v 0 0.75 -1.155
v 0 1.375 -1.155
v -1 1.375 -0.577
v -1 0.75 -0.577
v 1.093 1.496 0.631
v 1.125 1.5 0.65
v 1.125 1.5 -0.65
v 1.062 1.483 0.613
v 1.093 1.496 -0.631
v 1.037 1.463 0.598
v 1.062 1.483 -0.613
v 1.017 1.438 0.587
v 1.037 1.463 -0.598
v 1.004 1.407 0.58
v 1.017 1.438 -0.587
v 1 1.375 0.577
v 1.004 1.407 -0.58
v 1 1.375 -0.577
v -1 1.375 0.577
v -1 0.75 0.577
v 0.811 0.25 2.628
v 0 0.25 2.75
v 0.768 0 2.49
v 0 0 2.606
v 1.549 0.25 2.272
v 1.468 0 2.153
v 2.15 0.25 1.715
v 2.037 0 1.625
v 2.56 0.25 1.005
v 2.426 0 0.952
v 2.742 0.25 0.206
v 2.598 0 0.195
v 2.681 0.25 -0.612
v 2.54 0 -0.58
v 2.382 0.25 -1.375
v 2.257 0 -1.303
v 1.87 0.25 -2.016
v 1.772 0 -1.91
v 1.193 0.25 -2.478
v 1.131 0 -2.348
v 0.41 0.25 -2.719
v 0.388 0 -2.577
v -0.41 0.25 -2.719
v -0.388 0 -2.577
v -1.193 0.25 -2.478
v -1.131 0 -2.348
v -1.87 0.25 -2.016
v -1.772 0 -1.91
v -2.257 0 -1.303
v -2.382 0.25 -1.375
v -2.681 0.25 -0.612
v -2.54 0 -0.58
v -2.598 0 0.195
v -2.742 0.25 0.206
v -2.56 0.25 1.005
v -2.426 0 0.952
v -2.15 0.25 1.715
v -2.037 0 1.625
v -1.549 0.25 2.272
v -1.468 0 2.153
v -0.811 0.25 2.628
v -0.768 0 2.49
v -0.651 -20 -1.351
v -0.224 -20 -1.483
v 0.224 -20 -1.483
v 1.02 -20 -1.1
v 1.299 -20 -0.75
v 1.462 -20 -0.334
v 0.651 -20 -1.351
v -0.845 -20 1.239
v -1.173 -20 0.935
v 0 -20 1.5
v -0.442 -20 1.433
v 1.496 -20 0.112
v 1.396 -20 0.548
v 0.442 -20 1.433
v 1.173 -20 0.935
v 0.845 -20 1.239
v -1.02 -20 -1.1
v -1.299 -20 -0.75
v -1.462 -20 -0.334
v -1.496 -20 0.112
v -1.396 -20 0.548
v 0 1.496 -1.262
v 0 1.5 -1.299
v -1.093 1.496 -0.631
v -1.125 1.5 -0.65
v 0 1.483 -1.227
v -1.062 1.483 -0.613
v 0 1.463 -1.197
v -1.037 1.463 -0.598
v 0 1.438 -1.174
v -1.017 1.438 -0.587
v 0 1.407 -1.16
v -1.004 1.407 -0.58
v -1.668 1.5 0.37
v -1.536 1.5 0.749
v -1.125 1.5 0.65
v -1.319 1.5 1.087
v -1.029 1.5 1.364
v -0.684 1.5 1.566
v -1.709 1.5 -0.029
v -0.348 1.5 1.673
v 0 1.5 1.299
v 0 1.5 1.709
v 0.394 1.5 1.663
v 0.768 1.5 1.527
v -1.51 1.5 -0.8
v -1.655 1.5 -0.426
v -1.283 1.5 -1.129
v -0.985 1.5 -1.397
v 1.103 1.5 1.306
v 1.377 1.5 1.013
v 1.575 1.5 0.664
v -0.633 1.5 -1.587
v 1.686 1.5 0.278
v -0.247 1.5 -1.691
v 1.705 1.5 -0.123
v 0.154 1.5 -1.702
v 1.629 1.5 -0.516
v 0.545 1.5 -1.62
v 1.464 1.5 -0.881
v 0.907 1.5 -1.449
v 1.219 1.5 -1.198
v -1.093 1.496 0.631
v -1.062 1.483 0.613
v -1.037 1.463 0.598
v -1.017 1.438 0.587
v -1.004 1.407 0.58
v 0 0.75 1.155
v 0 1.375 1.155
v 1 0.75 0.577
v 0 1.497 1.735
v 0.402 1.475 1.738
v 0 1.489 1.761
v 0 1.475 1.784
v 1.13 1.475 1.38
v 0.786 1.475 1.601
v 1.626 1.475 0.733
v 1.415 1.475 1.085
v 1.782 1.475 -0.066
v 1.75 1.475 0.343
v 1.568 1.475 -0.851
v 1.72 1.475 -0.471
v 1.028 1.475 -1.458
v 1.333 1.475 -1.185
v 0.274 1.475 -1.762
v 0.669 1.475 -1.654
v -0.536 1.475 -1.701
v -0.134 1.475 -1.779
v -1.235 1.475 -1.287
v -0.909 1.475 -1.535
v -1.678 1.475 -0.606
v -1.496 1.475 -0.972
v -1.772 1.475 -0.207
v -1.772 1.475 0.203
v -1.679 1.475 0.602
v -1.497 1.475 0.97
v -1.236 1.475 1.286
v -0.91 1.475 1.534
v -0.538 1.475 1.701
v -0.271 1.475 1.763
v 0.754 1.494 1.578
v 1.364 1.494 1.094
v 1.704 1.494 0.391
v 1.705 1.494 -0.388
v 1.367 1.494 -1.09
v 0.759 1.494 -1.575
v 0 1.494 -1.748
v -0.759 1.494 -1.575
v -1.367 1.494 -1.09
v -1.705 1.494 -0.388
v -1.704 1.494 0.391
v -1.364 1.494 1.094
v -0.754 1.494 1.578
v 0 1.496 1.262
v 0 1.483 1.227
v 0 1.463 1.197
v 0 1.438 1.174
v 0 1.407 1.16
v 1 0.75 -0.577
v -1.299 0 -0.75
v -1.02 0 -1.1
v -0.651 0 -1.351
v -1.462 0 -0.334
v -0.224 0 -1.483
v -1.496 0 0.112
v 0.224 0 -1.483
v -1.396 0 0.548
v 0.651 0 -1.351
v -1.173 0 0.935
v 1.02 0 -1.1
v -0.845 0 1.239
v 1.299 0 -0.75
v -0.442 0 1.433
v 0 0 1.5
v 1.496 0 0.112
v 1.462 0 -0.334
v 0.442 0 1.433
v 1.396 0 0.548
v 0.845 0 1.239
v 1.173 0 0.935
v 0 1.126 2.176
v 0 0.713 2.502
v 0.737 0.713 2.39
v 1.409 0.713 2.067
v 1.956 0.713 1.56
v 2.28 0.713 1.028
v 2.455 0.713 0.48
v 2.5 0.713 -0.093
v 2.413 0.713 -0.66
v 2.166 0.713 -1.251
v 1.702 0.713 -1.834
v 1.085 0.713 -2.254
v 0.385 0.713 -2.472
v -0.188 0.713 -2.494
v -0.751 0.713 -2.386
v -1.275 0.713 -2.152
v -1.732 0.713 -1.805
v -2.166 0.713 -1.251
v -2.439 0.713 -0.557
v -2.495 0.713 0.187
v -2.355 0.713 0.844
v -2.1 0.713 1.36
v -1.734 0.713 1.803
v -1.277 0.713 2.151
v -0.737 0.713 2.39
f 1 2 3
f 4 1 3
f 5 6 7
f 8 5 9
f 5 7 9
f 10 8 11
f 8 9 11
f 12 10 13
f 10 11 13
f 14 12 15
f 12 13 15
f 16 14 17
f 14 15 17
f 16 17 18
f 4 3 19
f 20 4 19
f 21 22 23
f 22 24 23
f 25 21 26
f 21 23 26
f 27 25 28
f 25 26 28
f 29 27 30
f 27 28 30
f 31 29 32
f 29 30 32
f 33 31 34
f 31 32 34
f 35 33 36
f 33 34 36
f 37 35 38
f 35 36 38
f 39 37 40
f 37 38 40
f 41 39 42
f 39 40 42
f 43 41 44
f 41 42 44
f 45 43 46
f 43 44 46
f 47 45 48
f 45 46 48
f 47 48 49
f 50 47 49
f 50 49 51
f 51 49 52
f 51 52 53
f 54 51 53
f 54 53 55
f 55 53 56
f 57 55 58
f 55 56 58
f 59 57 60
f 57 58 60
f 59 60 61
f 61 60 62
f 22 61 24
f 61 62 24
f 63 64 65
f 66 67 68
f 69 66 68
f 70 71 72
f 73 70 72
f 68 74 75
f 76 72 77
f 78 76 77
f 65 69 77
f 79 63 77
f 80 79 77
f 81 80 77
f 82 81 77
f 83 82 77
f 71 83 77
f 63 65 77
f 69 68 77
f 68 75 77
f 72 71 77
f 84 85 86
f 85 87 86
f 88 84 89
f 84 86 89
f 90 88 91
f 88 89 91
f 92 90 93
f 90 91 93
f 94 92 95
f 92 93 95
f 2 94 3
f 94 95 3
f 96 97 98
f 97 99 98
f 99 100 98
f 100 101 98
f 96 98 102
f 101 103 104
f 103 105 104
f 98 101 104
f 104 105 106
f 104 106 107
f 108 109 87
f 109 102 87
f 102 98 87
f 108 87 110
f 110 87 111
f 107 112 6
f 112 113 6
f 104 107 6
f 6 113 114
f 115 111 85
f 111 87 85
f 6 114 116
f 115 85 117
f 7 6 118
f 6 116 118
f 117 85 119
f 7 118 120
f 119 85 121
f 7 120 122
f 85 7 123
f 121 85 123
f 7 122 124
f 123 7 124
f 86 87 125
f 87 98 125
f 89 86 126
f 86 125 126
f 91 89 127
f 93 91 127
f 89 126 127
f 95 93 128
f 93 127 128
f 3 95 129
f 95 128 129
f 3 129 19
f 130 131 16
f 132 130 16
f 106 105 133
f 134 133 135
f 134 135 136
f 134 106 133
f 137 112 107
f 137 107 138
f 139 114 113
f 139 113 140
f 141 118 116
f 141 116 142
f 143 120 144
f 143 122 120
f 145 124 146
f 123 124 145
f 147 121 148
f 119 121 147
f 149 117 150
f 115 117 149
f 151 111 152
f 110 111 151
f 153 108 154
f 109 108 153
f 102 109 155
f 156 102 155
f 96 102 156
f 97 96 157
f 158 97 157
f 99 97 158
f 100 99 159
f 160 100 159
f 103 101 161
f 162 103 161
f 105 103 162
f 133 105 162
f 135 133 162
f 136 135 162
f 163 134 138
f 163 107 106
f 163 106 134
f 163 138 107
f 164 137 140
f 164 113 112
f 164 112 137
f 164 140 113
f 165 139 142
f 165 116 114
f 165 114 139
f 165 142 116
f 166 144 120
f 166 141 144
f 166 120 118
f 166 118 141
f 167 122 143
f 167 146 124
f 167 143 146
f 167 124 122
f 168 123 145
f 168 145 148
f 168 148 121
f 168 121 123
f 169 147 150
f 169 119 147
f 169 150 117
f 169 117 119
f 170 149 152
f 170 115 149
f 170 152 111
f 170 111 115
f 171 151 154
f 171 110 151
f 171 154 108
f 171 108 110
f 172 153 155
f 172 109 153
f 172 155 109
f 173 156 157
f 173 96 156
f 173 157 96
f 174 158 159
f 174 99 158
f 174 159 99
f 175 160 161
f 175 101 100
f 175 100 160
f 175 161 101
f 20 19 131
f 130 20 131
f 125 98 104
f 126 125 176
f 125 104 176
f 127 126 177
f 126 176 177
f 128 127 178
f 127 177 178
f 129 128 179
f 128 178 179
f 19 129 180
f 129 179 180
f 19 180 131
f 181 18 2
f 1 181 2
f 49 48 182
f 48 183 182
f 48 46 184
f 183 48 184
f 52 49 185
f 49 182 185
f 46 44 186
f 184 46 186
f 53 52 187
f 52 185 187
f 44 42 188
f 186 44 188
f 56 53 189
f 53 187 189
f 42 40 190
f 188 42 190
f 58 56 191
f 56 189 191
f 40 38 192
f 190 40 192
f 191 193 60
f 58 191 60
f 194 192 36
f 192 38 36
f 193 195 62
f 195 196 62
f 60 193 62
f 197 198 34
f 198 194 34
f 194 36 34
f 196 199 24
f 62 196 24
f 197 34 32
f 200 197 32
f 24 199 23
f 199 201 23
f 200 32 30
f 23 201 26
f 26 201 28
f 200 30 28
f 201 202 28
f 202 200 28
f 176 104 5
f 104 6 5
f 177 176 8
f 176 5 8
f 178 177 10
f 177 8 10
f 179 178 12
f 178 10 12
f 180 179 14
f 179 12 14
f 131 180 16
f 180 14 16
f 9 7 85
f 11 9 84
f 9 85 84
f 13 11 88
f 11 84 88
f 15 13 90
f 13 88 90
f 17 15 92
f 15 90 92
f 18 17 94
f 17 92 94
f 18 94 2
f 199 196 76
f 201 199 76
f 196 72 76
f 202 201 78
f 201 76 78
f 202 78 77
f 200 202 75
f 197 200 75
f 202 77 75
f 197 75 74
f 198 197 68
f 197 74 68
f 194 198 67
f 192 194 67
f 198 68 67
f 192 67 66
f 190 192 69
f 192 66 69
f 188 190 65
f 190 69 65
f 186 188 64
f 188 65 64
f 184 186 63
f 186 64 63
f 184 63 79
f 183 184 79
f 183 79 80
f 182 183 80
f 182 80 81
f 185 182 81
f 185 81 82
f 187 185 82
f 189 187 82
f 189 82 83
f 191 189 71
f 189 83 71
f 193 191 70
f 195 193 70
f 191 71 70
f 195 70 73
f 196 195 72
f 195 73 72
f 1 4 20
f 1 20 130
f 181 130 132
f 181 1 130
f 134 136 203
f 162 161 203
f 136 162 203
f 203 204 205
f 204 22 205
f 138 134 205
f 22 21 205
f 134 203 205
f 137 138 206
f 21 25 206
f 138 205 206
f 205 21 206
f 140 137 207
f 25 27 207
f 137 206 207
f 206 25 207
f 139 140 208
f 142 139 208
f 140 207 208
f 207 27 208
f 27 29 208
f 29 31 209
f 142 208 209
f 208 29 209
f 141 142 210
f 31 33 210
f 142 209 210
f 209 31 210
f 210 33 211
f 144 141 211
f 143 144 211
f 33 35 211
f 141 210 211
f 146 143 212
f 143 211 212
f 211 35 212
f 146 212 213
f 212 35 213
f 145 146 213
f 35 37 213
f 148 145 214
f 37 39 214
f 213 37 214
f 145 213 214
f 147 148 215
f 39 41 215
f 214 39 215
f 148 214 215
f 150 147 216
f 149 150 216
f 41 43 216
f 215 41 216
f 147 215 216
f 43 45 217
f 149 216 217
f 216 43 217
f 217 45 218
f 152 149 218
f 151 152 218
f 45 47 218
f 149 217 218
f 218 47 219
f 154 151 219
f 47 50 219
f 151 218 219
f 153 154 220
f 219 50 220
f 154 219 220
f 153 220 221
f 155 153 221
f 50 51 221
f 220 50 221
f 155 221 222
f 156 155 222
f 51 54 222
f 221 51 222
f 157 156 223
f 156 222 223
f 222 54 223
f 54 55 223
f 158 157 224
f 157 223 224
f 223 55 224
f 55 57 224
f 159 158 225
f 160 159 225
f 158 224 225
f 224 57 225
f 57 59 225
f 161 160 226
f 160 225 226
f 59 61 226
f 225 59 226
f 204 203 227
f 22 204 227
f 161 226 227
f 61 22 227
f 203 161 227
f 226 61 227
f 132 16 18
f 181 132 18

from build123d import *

# Parameters (mm, degrees)
CUT_EXTRUDE1_DEPTH = 0.75
FILLET1_R          = 0.125


with BuildPart() as part:
    # Sketch1 → Revolve1 (revolve)
    with BuildSketch(Plane(origin=(0, 0, 0), x_dir=(0, 0, -1), z_dir=(1, 0, 0))):
        with BuildLine():
            Line((0, 1.5), (-1.75, 1.5))
            ThreePointArc((-1.75, 1.5), (-2.334912942, 0.942930354), (-2.75, 0.25))
            Line((-2.75, 0.25), (-2.605662433, 0))
            Line((-2.605662433, 0), (-1.5, 0))
            Line((-1.5, 0), (-1.5, -20))
            Line((-1.5, -20), (0, -20))
            Line((0, -20), (0, 1.5))
        make_face()
    revolve(axis=Axis((0, -20, 0), (0, 1, 0)))

    # Sketch2 → Cut-Extrude1 (cut)
    with BuildSketch(Plane(origin=(0, 1.5, 0), x_dir=(1, 0, 0), z_dir=(0, 1, 0))):
        Polygon((0, 1.154700538), (-1, 0.577350269), (-1, -0.577350269), (0, -1.154700538), (1, -0.577350269), (1, 0.577350269), align=None)
    extrude(amount=-CUT_EXTRUDE1_DEPTH, mode=Mode.SUBTRACT)

    # Fillet1
    fillet1_edges = [part.edges().sort_by_distance(p)[0] for p in [
        (0.5, 1.5, -0.866025404),
        (-0.5, 1.5, -0.866025404),
        (-1, 1.5, 0),
        (-0.5, 1.5, 0.866025404),
        (0.5, 1.5, 0.866025404),
        (1, 1.5, 0),
        (0, 1.5, -1.75),
    ]]
    fillet(fillet1_edges, radius=FILLET1_R)


solid = part.part
